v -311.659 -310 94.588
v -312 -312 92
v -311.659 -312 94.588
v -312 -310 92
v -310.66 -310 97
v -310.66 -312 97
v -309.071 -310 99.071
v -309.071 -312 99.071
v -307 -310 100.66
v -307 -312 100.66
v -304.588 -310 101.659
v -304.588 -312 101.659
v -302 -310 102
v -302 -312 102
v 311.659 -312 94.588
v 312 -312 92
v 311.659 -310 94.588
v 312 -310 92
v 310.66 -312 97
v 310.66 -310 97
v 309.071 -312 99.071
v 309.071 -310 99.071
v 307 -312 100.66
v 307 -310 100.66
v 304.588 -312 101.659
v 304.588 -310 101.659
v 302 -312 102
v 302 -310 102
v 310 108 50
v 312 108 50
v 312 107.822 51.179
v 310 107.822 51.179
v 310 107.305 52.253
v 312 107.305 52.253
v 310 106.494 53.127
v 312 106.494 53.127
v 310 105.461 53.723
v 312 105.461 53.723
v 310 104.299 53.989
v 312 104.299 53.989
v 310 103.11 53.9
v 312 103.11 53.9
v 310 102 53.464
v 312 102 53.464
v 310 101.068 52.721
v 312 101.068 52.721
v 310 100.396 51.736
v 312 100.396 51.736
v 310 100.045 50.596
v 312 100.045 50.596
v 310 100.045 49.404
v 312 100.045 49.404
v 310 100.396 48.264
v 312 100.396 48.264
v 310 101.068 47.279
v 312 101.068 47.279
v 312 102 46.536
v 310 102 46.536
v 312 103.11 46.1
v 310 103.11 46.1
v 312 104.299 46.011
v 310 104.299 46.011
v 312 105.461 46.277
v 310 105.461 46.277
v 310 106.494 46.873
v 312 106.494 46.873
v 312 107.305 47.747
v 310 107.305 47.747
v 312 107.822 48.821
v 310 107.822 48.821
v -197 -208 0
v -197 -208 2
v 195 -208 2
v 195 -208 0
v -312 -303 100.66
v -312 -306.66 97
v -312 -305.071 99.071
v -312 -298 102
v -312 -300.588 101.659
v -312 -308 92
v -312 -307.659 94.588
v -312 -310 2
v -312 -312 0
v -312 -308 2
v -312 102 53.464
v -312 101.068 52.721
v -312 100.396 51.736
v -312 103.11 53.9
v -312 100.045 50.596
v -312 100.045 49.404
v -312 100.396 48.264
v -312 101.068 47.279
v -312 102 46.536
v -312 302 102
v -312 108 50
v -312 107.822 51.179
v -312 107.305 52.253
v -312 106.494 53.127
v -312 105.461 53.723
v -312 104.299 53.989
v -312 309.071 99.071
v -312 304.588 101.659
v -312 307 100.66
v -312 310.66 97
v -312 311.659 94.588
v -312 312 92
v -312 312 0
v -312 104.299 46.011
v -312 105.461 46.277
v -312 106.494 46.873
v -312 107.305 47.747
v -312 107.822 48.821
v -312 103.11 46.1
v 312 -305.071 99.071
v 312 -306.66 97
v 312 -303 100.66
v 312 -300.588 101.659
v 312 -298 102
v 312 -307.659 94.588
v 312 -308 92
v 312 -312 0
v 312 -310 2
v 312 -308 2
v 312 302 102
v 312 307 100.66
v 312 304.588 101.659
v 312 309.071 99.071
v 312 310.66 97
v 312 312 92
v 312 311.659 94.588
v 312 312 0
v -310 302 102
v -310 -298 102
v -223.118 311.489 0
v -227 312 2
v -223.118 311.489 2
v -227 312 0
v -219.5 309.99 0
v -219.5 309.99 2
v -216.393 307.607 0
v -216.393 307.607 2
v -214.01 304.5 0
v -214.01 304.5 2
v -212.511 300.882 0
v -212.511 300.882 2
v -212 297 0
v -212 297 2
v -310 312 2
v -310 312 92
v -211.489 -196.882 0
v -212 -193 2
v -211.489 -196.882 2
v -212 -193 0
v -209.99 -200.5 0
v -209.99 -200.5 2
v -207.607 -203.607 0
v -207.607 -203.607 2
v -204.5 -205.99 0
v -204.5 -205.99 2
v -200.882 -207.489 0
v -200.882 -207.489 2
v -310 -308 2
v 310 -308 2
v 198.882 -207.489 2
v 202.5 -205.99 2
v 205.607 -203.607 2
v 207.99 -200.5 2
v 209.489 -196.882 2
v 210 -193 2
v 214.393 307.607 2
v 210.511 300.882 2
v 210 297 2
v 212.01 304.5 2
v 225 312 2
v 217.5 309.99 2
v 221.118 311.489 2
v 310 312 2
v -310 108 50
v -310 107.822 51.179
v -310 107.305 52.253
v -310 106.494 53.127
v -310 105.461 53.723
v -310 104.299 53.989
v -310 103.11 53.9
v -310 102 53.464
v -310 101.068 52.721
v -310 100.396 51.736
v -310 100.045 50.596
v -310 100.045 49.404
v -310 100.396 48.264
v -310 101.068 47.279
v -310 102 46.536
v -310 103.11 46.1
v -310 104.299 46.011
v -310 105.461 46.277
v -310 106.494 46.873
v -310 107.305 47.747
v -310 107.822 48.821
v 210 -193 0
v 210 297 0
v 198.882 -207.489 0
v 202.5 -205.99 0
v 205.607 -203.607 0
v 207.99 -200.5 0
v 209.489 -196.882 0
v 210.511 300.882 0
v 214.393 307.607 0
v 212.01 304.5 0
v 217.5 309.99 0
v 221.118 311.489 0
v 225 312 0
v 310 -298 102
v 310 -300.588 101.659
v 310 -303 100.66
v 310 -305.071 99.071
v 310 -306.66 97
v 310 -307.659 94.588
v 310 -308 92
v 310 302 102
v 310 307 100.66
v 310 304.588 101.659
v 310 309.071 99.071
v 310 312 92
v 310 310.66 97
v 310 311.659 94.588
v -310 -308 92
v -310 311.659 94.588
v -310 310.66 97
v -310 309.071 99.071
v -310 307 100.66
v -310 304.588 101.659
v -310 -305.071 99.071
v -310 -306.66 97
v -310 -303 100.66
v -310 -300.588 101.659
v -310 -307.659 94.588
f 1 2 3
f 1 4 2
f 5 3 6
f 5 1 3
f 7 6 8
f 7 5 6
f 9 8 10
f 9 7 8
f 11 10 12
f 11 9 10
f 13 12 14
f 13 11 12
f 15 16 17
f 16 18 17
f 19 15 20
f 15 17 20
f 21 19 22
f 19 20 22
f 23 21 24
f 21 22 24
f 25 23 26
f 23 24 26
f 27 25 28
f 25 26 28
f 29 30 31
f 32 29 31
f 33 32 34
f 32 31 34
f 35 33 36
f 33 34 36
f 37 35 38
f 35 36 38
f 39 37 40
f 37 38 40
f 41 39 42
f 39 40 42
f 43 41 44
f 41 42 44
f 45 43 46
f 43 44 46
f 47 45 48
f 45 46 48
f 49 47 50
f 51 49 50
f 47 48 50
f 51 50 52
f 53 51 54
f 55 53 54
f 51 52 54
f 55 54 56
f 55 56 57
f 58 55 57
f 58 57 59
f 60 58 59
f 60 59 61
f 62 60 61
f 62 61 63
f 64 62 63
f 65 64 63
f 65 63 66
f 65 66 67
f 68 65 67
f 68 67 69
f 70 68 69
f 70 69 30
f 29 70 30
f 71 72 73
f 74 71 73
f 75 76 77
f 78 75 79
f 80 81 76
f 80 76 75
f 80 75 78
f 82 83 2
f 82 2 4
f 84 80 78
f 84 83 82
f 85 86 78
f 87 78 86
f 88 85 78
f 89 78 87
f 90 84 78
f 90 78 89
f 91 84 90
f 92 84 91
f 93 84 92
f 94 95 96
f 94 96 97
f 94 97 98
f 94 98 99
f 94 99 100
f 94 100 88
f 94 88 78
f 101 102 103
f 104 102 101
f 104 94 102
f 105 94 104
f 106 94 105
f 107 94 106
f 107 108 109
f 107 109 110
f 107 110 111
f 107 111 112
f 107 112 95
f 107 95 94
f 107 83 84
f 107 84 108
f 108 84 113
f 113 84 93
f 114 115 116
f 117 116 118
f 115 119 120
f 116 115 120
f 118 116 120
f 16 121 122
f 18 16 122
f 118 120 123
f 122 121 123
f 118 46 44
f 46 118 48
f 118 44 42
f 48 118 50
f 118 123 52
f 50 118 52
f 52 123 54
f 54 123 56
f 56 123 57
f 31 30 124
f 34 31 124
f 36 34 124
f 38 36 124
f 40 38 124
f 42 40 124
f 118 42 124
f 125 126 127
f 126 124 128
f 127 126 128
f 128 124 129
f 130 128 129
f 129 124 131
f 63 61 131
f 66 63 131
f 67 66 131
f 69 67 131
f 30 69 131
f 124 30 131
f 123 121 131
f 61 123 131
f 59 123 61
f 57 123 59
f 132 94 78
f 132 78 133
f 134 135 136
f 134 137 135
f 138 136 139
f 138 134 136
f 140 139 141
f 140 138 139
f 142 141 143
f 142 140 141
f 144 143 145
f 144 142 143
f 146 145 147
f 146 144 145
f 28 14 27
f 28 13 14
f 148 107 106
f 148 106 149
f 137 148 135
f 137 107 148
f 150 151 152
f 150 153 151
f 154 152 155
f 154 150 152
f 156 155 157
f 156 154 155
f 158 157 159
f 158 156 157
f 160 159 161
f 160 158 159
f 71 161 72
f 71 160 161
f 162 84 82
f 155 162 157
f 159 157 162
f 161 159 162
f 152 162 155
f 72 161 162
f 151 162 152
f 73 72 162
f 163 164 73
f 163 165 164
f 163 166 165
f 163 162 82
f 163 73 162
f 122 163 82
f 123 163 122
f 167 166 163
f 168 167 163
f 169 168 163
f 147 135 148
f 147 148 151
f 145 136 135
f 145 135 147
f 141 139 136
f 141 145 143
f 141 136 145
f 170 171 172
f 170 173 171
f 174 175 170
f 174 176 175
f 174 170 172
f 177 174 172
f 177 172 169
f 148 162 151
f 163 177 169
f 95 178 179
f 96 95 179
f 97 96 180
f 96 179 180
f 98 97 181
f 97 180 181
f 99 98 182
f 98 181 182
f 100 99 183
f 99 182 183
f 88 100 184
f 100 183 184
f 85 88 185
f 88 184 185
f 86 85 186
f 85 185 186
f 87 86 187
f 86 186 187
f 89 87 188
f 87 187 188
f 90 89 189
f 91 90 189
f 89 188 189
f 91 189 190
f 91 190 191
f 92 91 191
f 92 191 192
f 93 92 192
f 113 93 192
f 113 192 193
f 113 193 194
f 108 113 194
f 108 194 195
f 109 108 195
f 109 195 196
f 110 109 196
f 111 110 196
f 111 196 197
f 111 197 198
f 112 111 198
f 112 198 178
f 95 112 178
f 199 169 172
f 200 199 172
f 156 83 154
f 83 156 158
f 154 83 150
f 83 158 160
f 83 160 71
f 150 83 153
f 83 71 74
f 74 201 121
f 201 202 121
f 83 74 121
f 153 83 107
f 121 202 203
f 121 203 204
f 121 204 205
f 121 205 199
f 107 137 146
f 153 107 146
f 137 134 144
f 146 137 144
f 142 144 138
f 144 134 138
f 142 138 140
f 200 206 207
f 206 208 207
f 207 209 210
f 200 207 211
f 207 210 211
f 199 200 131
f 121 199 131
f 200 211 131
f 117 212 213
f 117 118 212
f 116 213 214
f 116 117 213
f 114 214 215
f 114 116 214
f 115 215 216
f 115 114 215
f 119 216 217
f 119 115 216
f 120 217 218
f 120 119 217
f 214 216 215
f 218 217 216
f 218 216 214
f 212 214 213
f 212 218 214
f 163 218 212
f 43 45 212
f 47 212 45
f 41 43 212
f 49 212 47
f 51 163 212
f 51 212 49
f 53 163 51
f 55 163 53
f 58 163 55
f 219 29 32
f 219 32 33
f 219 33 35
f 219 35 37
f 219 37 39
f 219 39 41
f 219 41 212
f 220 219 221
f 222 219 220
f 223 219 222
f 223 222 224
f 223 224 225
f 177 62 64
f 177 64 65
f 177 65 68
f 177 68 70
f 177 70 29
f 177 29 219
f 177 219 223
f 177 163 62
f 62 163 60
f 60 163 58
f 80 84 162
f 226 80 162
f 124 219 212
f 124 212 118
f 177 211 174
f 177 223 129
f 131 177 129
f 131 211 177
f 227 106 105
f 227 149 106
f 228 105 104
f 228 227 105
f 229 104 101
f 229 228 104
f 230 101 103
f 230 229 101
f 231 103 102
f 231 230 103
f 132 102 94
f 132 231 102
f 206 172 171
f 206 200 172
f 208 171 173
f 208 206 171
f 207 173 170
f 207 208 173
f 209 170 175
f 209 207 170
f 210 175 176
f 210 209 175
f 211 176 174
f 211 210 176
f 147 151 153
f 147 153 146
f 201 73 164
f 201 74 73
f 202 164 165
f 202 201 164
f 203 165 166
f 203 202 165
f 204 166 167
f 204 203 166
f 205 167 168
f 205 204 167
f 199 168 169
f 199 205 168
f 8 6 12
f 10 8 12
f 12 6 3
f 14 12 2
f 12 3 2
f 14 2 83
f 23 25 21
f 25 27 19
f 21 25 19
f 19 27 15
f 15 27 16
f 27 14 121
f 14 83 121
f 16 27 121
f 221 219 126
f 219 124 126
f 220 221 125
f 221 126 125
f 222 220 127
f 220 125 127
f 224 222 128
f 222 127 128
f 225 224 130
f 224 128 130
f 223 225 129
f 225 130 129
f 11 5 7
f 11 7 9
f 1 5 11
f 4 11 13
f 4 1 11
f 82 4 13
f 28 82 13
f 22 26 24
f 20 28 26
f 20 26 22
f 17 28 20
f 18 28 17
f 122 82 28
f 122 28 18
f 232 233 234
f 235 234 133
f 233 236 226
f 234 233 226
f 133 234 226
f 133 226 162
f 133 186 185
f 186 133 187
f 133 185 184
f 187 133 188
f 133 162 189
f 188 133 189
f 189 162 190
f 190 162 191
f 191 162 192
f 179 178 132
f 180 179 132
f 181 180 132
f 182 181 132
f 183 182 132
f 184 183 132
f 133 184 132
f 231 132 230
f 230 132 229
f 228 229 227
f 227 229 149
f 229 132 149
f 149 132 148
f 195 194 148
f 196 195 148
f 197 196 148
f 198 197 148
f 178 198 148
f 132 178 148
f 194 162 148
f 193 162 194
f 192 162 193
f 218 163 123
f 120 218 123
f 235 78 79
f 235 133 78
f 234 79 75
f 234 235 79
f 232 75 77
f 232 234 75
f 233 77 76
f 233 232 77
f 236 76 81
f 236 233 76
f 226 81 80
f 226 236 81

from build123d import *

# Parameters (mm, degrees)
F0_W     = 624
F0_H     = 624
F1_DEPTH = 2
F2_W     = 624
F2_H     = 2
F2_W_2   = 2
F2_H_2   = 620
F3_DEPTH = 100
F4_R     = 10
F6_D     = 8
F7_W     = 422
F7_H     = 520
F8_DEPTH = 25
F9_R     = 15


with BuildPart() as f1:
    # F0 (on Top) → F1 (new body)
    with BuildSketch(Plane.XY):
        Rectangle(F0_W, F0_H)
    extrude(amount=F1_DEPTH)

    # F2 (on face) → F3 (join)
    with BuildSketch(Plane.XY.offset(2)):
        with Locations((0, -311)):
            Rectangle(F2_W, F2_H)
        with Locations((-311, 2)):
            Rectangle(F2_W_2, F2_H_2)
        with Locations((311, 2)):
            Rectangle(F2_W_2, F2_H_2)
    extrude(amount=F3_DEPTH)

    # F4
    f4_edges = [f1.edges().sort_by_distance(p)[0] for p in [
        (311, 312, 102),
        (-311, 312, 102),
        (-312, -311, 102),
        (-311, -308, 102),
        (311, -308, 102),
        (312, -311, 102),
    ]]
    fillet(f4_edges, radius=F4_R)

    # F6 (through all)
    with Locations(Plane(origin=(-312, 0, 0), x_dir=(0, -1, 0), z_dir=(-1, 0, 0))):
        with Locations((-104, 50)):
            Hole(F6_D / 2)

    # F7 (on face) → F8 (cut)
    with BuildSketch(Plane.XY.offset(2)):
        with Locations((-1, 52)):
            Rectangle(F7_W, F7_H)
    extrude(amount=-F8_DEPTH, mode=Mode.SUBTRACT)

    # F9
    f9_edges = [f1.edges().sort_by_distance(p)[0] for p in [
        (210, -208, 1),
        (210, 312, 1),
        (-212, 312, 1),
        (-212, -208, 1),
    ]]
    fillet(f9_edges, radius=F9_R)


solid = f1.part
